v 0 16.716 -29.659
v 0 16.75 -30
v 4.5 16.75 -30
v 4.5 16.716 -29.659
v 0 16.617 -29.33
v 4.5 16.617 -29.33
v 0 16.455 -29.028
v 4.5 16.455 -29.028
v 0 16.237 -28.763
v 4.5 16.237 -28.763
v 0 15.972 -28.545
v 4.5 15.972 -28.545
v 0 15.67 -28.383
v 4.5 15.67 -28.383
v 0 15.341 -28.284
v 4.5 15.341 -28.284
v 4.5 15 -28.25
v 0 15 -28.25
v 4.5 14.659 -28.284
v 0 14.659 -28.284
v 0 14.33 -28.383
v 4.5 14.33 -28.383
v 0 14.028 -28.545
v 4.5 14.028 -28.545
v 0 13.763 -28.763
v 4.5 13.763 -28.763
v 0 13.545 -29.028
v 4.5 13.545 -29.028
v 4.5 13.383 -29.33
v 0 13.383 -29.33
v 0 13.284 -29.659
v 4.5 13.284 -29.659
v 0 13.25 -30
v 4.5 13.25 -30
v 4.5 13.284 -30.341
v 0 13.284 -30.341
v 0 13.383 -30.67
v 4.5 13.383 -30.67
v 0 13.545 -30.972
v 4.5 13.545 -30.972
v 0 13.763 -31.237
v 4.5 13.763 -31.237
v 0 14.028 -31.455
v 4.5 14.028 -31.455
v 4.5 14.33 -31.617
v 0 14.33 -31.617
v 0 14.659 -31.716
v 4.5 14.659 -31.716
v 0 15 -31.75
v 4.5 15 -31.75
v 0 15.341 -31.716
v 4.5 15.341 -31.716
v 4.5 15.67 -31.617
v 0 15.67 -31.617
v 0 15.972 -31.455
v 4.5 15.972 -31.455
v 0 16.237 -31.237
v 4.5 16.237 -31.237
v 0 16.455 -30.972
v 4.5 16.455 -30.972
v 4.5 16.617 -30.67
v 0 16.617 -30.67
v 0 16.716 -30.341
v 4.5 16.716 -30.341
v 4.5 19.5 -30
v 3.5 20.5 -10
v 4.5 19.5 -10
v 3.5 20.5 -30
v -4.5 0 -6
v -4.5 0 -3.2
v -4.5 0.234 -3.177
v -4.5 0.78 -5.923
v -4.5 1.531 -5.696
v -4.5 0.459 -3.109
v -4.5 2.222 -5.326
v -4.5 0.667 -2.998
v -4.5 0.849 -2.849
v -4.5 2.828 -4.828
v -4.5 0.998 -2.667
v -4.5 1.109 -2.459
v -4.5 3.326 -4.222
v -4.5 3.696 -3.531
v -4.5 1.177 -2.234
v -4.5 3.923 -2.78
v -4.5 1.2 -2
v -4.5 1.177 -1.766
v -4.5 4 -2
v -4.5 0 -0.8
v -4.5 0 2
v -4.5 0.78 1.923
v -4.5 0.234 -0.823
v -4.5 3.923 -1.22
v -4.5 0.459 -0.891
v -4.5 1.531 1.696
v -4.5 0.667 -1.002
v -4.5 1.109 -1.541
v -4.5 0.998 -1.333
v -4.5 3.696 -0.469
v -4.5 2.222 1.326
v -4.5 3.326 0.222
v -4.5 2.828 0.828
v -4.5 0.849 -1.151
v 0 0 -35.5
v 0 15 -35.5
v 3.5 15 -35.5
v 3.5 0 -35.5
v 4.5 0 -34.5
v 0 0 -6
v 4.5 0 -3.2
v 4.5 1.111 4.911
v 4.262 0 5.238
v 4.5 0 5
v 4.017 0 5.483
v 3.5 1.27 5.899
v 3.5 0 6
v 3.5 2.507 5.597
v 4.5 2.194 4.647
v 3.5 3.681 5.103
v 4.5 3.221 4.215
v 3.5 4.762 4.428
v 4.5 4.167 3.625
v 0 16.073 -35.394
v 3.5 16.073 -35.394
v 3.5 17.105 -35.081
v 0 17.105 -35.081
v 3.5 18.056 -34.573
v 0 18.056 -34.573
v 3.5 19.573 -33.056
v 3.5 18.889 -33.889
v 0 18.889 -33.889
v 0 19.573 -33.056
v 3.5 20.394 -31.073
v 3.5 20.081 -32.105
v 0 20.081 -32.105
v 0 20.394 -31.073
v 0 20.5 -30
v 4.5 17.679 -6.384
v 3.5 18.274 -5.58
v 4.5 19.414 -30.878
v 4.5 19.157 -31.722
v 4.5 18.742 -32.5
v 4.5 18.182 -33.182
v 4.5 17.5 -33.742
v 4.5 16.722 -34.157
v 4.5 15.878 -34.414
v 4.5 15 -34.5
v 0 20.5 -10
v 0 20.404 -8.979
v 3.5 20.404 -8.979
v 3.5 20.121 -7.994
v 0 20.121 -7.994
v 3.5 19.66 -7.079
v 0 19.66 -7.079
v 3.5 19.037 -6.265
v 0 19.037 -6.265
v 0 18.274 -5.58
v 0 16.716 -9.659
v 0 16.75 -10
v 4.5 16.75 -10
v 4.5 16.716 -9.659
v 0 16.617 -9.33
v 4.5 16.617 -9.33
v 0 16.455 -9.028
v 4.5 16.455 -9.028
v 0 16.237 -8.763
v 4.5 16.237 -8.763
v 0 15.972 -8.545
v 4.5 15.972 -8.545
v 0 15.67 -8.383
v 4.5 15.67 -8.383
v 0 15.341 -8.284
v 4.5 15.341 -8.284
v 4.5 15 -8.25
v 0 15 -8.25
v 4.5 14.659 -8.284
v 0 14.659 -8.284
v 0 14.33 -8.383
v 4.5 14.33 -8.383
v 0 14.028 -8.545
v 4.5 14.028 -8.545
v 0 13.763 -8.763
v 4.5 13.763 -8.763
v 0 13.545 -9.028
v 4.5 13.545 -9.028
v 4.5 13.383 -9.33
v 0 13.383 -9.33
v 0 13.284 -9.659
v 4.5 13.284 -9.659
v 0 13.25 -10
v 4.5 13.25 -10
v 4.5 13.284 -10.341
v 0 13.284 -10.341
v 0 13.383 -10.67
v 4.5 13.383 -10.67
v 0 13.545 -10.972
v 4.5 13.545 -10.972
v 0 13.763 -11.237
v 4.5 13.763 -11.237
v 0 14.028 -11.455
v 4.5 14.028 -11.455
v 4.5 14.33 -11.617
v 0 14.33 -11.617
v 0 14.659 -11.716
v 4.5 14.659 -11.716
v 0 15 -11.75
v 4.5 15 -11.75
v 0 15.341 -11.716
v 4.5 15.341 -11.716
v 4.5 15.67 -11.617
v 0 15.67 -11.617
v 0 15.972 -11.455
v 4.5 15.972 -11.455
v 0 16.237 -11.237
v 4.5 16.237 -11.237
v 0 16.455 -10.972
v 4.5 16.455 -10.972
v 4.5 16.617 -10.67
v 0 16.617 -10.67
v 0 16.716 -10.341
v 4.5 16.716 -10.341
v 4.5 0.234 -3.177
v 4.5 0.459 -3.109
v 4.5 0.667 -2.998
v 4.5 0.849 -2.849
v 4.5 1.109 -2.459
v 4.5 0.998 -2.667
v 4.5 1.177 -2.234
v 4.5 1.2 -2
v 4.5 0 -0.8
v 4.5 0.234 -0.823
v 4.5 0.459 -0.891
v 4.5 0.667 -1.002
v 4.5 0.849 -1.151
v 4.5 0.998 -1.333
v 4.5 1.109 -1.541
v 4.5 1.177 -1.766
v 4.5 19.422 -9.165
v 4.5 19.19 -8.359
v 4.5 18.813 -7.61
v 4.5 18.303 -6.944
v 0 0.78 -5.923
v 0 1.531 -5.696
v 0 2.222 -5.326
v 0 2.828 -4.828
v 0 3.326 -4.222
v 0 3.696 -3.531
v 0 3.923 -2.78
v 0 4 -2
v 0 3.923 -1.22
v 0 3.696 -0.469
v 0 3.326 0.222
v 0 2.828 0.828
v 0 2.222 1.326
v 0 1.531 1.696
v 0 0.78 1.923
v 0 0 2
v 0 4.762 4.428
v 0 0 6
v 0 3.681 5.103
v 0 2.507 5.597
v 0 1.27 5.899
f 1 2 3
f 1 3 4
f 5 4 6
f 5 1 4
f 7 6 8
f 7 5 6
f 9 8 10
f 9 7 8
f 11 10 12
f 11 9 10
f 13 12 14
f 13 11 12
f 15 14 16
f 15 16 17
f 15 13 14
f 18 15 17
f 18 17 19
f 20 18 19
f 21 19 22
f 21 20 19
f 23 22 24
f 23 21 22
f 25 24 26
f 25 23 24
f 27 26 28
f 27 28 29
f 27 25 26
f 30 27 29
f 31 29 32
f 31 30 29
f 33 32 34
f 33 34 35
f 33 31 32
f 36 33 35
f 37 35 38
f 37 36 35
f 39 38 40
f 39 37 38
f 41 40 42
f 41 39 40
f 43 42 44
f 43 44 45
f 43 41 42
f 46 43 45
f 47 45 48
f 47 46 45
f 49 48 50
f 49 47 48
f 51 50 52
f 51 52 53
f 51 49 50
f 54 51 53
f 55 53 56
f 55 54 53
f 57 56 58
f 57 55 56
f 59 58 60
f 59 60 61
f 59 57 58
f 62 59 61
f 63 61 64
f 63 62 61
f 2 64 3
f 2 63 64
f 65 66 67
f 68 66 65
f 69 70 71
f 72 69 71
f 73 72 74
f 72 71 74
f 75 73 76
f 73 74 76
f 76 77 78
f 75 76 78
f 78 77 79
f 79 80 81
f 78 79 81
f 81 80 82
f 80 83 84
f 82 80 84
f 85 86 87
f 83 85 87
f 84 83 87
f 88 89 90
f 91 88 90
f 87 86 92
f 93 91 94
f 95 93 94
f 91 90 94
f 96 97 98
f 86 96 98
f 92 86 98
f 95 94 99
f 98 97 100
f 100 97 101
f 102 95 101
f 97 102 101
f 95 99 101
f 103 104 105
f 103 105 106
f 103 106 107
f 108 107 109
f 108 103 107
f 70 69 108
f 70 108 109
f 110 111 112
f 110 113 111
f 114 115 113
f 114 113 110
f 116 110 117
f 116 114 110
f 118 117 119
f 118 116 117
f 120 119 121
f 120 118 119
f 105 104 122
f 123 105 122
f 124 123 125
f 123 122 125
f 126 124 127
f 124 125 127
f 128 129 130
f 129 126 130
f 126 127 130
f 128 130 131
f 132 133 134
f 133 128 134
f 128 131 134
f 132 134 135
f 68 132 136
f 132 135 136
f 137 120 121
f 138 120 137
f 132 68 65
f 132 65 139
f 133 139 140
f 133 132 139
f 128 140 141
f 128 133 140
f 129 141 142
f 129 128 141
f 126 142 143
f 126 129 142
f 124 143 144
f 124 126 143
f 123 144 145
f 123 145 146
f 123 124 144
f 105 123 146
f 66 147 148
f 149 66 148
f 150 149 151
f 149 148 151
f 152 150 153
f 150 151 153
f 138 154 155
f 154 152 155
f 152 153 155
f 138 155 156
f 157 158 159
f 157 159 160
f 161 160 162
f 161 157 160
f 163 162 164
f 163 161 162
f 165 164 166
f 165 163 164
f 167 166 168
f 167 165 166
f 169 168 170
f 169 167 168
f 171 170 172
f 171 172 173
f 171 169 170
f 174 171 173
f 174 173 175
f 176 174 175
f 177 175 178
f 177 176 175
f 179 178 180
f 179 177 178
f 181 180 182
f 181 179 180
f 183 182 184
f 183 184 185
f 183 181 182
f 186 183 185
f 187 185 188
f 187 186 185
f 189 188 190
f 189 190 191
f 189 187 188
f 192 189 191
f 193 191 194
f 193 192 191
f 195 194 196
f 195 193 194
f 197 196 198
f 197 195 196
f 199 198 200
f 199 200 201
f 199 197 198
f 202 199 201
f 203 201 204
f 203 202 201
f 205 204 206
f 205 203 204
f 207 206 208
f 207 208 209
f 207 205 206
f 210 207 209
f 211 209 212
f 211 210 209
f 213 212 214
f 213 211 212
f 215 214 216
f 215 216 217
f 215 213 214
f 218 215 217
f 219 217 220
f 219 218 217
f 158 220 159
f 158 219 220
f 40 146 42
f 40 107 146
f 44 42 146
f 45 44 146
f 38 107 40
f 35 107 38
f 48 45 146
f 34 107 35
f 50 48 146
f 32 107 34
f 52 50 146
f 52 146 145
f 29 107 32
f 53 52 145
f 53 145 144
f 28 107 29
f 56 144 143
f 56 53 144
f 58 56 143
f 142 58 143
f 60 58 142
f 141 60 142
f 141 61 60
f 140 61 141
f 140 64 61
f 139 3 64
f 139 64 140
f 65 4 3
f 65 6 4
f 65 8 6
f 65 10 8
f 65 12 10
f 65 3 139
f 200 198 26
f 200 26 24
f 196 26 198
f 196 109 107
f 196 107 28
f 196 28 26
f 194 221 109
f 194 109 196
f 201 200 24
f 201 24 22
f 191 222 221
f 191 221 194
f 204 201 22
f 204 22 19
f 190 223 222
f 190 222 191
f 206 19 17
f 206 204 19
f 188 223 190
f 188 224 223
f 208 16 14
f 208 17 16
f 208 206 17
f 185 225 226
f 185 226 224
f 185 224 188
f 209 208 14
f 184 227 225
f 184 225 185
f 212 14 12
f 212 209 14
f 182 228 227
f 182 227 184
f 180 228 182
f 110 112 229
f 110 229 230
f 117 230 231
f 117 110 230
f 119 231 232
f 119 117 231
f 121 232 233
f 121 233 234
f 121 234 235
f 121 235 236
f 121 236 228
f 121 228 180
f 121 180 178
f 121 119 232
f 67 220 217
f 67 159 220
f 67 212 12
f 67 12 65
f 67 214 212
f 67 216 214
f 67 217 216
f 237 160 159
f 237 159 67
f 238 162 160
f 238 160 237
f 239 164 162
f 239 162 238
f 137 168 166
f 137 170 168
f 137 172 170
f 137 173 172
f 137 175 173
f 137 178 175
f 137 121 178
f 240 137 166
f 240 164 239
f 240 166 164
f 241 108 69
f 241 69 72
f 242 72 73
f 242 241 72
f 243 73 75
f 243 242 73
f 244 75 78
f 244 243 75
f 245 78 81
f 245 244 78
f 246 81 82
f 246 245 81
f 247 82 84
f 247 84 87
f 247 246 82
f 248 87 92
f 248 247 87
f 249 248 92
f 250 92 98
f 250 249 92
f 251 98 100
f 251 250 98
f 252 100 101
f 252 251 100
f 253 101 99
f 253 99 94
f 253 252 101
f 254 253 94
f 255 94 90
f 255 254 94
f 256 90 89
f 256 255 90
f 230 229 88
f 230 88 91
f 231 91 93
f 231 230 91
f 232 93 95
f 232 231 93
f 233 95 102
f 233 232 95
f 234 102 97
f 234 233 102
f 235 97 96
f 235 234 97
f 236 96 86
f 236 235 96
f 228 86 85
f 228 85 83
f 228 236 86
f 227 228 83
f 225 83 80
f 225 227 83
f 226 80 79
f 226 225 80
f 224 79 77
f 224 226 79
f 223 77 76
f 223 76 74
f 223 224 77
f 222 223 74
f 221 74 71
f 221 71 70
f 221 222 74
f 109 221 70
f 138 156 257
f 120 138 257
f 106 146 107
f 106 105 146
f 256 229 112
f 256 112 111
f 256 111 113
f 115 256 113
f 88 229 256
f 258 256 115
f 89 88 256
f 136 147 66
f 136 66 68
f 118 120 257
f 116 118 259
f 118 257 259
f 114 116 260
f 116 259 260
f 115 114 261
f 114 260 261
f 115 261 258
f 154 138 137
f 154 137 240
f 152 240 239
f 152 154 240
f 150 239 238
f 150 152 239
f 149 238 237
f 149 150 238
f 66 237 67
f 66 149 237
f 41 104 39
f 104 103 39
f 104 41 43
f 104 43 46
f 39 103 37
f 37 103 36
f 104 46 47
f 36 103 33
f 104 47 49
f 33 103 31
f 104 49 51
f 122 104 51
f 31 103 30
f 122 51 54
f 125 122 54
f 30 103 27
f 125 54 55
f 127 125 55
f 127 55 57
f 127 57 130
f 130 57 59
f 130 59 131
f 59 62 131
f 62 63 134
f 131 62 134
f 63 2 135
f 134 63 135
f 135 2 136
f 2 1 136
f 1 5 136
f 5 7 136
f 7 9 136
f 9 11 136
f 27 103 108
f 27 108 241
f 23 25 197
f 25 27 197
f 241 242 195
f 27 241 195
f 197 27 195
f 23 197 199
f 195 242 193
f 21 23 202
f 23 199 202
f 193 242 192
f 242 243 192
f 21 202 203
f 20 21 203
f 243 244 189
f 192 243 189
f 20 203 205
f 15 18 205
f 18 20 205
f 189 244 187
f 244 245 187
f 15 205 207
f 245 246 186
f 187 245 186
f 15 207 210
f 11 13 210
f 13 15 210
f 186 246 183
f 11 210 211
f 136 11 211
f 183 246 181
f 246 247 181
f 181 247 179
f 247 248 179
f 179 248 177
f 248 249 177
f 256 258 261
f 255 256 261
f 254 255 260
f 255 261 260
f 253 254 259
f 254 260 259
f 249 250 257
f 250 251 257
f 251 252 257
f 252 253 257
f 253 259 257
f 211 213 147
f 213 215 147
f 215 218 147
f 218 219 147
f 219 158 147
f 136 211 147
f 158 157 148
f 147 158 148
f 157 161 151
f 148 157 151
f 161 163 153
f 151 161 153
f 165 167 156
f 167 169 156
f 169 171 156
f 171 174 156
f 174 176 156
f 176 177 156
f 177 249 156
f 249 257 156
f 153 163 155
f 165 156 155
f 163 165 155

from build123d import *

# Parameters (mm, degrees)
SKETCH037_R     = 1.75
PAD011_DEPTH    = 4.5
PAD012_DEPTH    = 4.5
POCKET012_DEPTH = 9
CHAMFER006_SIZE = 1


with BuildPart() as body017:
    # Sketch037 → Pad011 (new body)
    with BuildSketch(Plane.YZ):
        with BuildLine():
            ThreePointArc((4.76184, 4.428443), (2.507235, 5.596958), (0, 6))
            Line((0, -35.5), (0, 6))
            Line((15.000002, -35.5), (0, -35.5))
            ThreePointArc((15.000002, -35.5), (18.889094, -33.88908), (20.5, -29.999981))
            Line((20.5, -10.000019), (20.5, -29.999981))
            ThreePointArc((20.5, -10.000019), (19.912019, -7.525718), (18.273777, -5.580455))
            Line((18.273777, -5.580455), (4.76184, 4.428443))
        make_face()
        with Locations((15, -10)):
            Circle(SKETCH037_R, mode=Mode.SUBTRACT)
        with Locations((15, -30)):
            Circle(SKETCH037_R, mode=Mode.SUBTRACT)
    extrude(amount=-PAD011_DEPTH)

    # Sketch038 (on Pad) → Pad012 (join)
    with BuildSketch(Plane.YZ):
        with BuildLine():
            ThreePointArc((0, -6), (4, -2), (0, 2))
            Line((0, 2), (0, -6))
        make_face()
    extrude(amount=PAD012_DEPTH)

    # Sketch039 (on Face5 of Pad012) → Pocket012 (cut)
    with BuildSketch(Plane(origin=(-4.5, 0, 0), x_dir=(0, 1, 0), z_dir=(-1, 0, 0))):
        with BuildLine():
            ThreePointArc((0, 0.8), (1.2, 2), (0, 3.2))
            Line((0, 3.2), (0, 0.8))
        make_face()
    extrude(amount=-POCKET012_DEPTH, mode=Mode.SUBTRACT)

    # Chamfer006
    chamfer006_edges = [body017.edges().sort_by_distance(p)[0] for p in [
        (-4.5, 7.500001, -35.5),
    ]]
    chamfer(chamfer006_edges, length=CHAMFER006_SIZE)


with BuildPart() as part_mirroring011:
    # Part__Mirroring011: instance of Body017
    add(body017.part.mirror(Plane(origin=(0, 0, 0), x_dir=(0, -1, 0), z_dir=(1, 0, 0))))


solid = part_mirroring011.part
